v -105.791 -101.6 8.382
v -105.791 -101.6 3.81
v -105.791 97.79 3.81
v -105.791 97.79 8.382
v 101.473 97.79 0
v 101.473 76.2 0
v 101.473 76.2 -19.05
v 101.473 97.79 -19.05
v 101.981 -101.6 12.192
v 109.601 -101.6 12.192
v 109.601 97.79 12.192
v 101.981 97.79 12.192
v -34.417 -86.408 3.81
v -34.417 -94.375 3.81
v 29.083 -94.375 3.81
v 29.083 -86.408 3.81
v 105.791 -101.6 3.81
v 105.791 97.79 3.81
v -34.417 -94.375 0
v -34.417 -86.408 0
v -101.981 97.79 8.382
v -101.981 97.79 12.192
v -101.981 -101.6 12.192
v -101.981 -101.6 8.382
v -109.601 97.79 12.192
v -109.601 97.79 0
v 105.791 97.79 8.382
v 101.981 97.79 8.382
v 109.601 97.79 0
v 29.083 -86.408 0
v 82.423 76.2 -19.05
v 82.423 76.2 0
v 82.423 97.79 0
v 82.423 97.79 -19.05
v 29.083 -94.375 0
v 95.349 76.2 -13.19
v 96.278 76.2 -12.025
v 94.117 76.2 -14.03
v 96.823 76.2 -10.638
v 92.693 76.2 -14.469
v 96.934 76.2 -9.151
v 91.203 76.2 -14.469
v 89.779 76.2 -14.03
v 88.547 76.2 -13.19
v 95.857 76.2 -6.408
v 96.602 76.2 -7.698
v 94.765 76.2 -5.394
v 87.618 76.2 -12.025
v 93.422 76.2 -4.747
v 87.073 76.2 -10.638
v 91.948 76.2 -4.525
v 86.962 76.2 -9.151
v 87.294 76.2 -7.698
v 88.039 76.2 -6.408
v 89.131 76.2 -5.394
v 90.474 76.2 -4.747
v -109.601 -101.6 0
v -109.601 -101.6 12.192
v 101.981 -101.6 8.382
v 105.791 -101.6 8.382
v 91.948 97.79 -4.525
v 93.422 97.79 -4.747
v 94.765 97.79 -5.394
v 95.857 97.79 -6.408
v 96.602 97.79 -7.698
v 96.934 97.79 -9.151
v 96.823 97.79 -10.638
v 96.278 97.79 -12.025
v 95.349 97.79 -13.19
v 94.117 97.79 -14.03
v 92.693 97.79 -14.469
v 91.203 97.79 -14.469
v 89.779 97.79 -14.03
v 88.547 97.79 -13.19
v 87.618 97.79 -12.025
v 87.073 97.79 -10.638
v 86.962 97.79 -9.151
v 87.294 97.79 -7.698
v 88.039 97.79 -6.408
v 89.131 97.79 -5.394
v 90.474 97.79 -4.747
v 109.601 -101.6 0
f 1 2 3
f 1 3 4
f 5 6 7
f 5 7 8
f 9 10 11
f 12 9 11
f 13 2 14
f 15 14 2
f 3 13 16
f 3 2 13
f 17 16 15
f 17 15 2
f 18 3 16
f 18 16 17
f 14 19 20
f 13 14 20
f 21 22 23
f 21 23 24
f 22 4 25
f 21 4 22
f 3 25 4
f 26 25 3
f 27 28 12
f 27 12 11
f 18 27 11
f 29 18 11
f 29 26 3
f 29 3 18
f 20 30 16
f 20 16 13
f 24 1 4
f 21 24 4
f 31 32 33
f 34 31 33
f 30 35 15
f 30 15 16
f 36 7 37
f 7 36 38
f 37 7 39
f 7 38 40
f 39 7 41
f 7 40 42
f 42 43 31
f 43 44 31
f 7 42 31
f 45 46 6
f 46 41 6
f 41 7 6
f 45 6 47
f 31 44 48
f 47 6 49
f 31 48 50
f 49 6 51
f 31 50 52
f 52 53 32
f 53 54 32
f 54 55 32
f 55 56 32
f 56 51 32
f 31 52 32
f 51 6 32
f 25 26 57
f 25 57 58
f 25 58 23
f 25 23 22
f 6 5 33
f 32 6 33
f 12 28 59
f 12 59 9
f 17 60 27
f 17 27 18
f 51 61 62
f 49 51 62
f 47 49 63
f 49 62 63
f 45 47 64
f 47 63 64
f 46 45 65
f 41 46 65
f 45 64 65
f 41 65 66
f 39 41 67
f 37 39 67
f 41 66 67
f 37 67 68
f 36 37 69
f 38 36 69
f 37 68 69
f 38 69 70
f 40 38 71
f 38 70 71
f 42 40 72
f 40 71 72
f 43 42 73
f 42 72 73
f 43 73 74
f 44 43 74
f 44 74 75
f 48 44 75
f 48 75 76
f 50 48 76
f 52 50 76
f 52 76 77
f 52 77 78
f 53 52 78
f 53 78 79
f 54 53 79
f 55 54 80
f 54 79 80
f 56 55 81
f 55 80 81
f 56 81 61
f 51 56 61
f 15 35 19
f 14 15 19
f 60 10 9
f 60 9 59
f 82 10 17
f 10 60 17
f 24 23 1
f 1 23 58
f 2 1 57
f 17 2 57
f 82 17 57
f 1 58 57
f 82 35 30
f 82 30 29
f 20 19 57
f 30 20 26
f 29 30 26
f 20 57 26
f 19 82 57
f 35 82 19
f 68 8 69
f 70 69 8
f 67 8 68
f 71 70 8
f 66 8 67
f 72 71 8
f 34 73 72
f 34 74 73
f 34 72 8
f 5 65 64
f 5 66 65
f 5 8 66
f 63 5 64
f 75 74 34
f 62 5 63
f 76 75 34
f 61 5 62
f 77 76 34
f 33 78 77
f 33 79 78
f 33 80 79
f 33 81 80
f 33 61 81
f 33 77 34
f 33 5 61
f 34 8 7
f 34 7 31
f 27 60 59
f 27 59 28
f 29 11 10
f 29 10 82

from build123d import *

# Parameters (mm, degrees)
SKETCH2_W           = 211.582
SKETCH2_H           = 203.2
BOSS_EXTRUDE1_DEPTH = 3.81
SKETCH4_W           = 12.192
SKETCH4_H           = 203.2
BOSS_EXTRUDE2_DEPTH = 3.81
SKETCH5_W           = 12.192
SKETCH5_H           = 203.2
BOSS_EXTRUDE3_DEPTH = 3.81
SKETCH6_W           = 3.81
SKETCH6_H           = 203.2
BOSS_EXTRUDE4_DEPTH = 3.81
SKETCH7_W           = 3.81
SKETCH7_H           = 203.2
BOSS_EXTRUDE5_DEPTH = 3.81
SKETCH9_W           = 254.111946297
SKETCH9_H           = 63.326566198
CUT_EXTRUDE1_DEPTH  = 3.81
SKETCH10_W          = 19.05
SKETCH10_H          = 21.59
BOSS_EXTRUDE6_DEPTH = 19.05
SKETCH11_R          = 5
CUT_EXTRUDE2_DEPTH  = 21.59
SKETCH13_W          = 63.5
SKETCH13_H          = 7.966641974
CUT_EXTRUDE3_DEPTH  = 3.81


with BuildPart() as part:
    # Sketch2 → Boss-Extrude1 (new body)
    with BuildSketch(Plane.XY):
        Rectangle(SKETCH2_W, SKETCH2_H)
    extrude(amount=BOSS_EXTRUDE1_DEPTH)

    # Sketch4 → Boss-Extrude2 (add)
    with BuildSketch(Plane.ZY.offset(105.791)):
        with Locations((6.096, 0)):
            Rectangle(SKETCH4_W, SKETCH4_H)
    extrude(amount=BOSS_EXTRUDE2_DEPTH)

    # Sketch5 → Boss-Extrude3 (add)
    with BuildSketch(Plane(origin=(105.791, 0, 0), x_dir=(0, 0, -1), z_dir=(1, 0, 0))):
        with Locations((-6.096, 0)):
            Rectangle(SKETCH5_W, SKETCH5_H)
    extrude(amount=BOSS_EXTRUDE3_DEPTH)

    # Sketch6 → Boss-Extrude4 (add)
    with BuildSketch(Plane.ZY.offset(-105.791)):
        with Locations((10.287, 0)):
            Rectangle(SKETCH6_W, SKETCH6_H)
    extrude(amount=BOSS_EXTRUDE4_DEPTH)

    # Sketch7 → Boss-Extrude5 (add)
    with BuildSketch(Plane(origin=(-105.791, 0, 0), x_dir=(0, 0, -1), z_dir=(1, 0, 0))):
        with Locations((-10.287, 0)):
            Rectangle(SKETCH7_W, SKETCH7_H)
    extrude(amount=BOSS_EXTRUDE5_DEPTH)

    # Sketch9 → Cut-Extrude1 (cut)
    with BuildSketch(Plane(origin=(0, 101.6, 0), x_dir=(1, 0, 0), z_dir=(0, 1, 0))):
        with Locations((-4.27011197, -1.772499308)):
            Rectangle(SKETCH9_W, SKETCH9_H)
    extrude(amount=-CUT_EXTRUDE1_DEPTH, mode=Mode.SUBTRACT)

    # Sketch13 → Cut-Extrude3 (cut)
    with BuildSketch(Plane(origin=(0, 0, 0), x_dir=(-1, 0, 0), z_dir=(0, 0, -1))):
        with Locations((2.667, -90.391630491)):
            Rectangle(SKETCH13_W, SKETCH13_H)
    extrude(amount=-CUT_EXTRUDE3_DEPTH, mode=Mode.SUBTRACT)


with BuildPart() as body_2:
    # Sketch10 → Boss-Extrude6 (new body)
    with BuildSketch(Plane(origin=(0, 0, 0), x_dir=(-1, 0, 0), z_dir=(0, 0, -1))):
        with Locations((-91.948, 86.995)):
            Rectangle(SKETCH10_W, SKETCH10_H)
    extrude(amount=BOSS_EXTRUDE6_DEPTH)

    # Sketch11 → Cut-Extrude2 (cut)
    with BuildSketch(Plane(origin=(0, 97.79, 0), x_dir=(1, 0, 0), z_dir=(0, 1, 0))):
        with Locations(Location((91.948, 9.525, 0), (0, 0, 270))):
            Circle(SKETCH11_R)
    extrude(amount=-CUT_EXTRUDE2_DEPTH, mode=Mode.SUBTRACT)


solid = Compound([part.part, body_2.part])
